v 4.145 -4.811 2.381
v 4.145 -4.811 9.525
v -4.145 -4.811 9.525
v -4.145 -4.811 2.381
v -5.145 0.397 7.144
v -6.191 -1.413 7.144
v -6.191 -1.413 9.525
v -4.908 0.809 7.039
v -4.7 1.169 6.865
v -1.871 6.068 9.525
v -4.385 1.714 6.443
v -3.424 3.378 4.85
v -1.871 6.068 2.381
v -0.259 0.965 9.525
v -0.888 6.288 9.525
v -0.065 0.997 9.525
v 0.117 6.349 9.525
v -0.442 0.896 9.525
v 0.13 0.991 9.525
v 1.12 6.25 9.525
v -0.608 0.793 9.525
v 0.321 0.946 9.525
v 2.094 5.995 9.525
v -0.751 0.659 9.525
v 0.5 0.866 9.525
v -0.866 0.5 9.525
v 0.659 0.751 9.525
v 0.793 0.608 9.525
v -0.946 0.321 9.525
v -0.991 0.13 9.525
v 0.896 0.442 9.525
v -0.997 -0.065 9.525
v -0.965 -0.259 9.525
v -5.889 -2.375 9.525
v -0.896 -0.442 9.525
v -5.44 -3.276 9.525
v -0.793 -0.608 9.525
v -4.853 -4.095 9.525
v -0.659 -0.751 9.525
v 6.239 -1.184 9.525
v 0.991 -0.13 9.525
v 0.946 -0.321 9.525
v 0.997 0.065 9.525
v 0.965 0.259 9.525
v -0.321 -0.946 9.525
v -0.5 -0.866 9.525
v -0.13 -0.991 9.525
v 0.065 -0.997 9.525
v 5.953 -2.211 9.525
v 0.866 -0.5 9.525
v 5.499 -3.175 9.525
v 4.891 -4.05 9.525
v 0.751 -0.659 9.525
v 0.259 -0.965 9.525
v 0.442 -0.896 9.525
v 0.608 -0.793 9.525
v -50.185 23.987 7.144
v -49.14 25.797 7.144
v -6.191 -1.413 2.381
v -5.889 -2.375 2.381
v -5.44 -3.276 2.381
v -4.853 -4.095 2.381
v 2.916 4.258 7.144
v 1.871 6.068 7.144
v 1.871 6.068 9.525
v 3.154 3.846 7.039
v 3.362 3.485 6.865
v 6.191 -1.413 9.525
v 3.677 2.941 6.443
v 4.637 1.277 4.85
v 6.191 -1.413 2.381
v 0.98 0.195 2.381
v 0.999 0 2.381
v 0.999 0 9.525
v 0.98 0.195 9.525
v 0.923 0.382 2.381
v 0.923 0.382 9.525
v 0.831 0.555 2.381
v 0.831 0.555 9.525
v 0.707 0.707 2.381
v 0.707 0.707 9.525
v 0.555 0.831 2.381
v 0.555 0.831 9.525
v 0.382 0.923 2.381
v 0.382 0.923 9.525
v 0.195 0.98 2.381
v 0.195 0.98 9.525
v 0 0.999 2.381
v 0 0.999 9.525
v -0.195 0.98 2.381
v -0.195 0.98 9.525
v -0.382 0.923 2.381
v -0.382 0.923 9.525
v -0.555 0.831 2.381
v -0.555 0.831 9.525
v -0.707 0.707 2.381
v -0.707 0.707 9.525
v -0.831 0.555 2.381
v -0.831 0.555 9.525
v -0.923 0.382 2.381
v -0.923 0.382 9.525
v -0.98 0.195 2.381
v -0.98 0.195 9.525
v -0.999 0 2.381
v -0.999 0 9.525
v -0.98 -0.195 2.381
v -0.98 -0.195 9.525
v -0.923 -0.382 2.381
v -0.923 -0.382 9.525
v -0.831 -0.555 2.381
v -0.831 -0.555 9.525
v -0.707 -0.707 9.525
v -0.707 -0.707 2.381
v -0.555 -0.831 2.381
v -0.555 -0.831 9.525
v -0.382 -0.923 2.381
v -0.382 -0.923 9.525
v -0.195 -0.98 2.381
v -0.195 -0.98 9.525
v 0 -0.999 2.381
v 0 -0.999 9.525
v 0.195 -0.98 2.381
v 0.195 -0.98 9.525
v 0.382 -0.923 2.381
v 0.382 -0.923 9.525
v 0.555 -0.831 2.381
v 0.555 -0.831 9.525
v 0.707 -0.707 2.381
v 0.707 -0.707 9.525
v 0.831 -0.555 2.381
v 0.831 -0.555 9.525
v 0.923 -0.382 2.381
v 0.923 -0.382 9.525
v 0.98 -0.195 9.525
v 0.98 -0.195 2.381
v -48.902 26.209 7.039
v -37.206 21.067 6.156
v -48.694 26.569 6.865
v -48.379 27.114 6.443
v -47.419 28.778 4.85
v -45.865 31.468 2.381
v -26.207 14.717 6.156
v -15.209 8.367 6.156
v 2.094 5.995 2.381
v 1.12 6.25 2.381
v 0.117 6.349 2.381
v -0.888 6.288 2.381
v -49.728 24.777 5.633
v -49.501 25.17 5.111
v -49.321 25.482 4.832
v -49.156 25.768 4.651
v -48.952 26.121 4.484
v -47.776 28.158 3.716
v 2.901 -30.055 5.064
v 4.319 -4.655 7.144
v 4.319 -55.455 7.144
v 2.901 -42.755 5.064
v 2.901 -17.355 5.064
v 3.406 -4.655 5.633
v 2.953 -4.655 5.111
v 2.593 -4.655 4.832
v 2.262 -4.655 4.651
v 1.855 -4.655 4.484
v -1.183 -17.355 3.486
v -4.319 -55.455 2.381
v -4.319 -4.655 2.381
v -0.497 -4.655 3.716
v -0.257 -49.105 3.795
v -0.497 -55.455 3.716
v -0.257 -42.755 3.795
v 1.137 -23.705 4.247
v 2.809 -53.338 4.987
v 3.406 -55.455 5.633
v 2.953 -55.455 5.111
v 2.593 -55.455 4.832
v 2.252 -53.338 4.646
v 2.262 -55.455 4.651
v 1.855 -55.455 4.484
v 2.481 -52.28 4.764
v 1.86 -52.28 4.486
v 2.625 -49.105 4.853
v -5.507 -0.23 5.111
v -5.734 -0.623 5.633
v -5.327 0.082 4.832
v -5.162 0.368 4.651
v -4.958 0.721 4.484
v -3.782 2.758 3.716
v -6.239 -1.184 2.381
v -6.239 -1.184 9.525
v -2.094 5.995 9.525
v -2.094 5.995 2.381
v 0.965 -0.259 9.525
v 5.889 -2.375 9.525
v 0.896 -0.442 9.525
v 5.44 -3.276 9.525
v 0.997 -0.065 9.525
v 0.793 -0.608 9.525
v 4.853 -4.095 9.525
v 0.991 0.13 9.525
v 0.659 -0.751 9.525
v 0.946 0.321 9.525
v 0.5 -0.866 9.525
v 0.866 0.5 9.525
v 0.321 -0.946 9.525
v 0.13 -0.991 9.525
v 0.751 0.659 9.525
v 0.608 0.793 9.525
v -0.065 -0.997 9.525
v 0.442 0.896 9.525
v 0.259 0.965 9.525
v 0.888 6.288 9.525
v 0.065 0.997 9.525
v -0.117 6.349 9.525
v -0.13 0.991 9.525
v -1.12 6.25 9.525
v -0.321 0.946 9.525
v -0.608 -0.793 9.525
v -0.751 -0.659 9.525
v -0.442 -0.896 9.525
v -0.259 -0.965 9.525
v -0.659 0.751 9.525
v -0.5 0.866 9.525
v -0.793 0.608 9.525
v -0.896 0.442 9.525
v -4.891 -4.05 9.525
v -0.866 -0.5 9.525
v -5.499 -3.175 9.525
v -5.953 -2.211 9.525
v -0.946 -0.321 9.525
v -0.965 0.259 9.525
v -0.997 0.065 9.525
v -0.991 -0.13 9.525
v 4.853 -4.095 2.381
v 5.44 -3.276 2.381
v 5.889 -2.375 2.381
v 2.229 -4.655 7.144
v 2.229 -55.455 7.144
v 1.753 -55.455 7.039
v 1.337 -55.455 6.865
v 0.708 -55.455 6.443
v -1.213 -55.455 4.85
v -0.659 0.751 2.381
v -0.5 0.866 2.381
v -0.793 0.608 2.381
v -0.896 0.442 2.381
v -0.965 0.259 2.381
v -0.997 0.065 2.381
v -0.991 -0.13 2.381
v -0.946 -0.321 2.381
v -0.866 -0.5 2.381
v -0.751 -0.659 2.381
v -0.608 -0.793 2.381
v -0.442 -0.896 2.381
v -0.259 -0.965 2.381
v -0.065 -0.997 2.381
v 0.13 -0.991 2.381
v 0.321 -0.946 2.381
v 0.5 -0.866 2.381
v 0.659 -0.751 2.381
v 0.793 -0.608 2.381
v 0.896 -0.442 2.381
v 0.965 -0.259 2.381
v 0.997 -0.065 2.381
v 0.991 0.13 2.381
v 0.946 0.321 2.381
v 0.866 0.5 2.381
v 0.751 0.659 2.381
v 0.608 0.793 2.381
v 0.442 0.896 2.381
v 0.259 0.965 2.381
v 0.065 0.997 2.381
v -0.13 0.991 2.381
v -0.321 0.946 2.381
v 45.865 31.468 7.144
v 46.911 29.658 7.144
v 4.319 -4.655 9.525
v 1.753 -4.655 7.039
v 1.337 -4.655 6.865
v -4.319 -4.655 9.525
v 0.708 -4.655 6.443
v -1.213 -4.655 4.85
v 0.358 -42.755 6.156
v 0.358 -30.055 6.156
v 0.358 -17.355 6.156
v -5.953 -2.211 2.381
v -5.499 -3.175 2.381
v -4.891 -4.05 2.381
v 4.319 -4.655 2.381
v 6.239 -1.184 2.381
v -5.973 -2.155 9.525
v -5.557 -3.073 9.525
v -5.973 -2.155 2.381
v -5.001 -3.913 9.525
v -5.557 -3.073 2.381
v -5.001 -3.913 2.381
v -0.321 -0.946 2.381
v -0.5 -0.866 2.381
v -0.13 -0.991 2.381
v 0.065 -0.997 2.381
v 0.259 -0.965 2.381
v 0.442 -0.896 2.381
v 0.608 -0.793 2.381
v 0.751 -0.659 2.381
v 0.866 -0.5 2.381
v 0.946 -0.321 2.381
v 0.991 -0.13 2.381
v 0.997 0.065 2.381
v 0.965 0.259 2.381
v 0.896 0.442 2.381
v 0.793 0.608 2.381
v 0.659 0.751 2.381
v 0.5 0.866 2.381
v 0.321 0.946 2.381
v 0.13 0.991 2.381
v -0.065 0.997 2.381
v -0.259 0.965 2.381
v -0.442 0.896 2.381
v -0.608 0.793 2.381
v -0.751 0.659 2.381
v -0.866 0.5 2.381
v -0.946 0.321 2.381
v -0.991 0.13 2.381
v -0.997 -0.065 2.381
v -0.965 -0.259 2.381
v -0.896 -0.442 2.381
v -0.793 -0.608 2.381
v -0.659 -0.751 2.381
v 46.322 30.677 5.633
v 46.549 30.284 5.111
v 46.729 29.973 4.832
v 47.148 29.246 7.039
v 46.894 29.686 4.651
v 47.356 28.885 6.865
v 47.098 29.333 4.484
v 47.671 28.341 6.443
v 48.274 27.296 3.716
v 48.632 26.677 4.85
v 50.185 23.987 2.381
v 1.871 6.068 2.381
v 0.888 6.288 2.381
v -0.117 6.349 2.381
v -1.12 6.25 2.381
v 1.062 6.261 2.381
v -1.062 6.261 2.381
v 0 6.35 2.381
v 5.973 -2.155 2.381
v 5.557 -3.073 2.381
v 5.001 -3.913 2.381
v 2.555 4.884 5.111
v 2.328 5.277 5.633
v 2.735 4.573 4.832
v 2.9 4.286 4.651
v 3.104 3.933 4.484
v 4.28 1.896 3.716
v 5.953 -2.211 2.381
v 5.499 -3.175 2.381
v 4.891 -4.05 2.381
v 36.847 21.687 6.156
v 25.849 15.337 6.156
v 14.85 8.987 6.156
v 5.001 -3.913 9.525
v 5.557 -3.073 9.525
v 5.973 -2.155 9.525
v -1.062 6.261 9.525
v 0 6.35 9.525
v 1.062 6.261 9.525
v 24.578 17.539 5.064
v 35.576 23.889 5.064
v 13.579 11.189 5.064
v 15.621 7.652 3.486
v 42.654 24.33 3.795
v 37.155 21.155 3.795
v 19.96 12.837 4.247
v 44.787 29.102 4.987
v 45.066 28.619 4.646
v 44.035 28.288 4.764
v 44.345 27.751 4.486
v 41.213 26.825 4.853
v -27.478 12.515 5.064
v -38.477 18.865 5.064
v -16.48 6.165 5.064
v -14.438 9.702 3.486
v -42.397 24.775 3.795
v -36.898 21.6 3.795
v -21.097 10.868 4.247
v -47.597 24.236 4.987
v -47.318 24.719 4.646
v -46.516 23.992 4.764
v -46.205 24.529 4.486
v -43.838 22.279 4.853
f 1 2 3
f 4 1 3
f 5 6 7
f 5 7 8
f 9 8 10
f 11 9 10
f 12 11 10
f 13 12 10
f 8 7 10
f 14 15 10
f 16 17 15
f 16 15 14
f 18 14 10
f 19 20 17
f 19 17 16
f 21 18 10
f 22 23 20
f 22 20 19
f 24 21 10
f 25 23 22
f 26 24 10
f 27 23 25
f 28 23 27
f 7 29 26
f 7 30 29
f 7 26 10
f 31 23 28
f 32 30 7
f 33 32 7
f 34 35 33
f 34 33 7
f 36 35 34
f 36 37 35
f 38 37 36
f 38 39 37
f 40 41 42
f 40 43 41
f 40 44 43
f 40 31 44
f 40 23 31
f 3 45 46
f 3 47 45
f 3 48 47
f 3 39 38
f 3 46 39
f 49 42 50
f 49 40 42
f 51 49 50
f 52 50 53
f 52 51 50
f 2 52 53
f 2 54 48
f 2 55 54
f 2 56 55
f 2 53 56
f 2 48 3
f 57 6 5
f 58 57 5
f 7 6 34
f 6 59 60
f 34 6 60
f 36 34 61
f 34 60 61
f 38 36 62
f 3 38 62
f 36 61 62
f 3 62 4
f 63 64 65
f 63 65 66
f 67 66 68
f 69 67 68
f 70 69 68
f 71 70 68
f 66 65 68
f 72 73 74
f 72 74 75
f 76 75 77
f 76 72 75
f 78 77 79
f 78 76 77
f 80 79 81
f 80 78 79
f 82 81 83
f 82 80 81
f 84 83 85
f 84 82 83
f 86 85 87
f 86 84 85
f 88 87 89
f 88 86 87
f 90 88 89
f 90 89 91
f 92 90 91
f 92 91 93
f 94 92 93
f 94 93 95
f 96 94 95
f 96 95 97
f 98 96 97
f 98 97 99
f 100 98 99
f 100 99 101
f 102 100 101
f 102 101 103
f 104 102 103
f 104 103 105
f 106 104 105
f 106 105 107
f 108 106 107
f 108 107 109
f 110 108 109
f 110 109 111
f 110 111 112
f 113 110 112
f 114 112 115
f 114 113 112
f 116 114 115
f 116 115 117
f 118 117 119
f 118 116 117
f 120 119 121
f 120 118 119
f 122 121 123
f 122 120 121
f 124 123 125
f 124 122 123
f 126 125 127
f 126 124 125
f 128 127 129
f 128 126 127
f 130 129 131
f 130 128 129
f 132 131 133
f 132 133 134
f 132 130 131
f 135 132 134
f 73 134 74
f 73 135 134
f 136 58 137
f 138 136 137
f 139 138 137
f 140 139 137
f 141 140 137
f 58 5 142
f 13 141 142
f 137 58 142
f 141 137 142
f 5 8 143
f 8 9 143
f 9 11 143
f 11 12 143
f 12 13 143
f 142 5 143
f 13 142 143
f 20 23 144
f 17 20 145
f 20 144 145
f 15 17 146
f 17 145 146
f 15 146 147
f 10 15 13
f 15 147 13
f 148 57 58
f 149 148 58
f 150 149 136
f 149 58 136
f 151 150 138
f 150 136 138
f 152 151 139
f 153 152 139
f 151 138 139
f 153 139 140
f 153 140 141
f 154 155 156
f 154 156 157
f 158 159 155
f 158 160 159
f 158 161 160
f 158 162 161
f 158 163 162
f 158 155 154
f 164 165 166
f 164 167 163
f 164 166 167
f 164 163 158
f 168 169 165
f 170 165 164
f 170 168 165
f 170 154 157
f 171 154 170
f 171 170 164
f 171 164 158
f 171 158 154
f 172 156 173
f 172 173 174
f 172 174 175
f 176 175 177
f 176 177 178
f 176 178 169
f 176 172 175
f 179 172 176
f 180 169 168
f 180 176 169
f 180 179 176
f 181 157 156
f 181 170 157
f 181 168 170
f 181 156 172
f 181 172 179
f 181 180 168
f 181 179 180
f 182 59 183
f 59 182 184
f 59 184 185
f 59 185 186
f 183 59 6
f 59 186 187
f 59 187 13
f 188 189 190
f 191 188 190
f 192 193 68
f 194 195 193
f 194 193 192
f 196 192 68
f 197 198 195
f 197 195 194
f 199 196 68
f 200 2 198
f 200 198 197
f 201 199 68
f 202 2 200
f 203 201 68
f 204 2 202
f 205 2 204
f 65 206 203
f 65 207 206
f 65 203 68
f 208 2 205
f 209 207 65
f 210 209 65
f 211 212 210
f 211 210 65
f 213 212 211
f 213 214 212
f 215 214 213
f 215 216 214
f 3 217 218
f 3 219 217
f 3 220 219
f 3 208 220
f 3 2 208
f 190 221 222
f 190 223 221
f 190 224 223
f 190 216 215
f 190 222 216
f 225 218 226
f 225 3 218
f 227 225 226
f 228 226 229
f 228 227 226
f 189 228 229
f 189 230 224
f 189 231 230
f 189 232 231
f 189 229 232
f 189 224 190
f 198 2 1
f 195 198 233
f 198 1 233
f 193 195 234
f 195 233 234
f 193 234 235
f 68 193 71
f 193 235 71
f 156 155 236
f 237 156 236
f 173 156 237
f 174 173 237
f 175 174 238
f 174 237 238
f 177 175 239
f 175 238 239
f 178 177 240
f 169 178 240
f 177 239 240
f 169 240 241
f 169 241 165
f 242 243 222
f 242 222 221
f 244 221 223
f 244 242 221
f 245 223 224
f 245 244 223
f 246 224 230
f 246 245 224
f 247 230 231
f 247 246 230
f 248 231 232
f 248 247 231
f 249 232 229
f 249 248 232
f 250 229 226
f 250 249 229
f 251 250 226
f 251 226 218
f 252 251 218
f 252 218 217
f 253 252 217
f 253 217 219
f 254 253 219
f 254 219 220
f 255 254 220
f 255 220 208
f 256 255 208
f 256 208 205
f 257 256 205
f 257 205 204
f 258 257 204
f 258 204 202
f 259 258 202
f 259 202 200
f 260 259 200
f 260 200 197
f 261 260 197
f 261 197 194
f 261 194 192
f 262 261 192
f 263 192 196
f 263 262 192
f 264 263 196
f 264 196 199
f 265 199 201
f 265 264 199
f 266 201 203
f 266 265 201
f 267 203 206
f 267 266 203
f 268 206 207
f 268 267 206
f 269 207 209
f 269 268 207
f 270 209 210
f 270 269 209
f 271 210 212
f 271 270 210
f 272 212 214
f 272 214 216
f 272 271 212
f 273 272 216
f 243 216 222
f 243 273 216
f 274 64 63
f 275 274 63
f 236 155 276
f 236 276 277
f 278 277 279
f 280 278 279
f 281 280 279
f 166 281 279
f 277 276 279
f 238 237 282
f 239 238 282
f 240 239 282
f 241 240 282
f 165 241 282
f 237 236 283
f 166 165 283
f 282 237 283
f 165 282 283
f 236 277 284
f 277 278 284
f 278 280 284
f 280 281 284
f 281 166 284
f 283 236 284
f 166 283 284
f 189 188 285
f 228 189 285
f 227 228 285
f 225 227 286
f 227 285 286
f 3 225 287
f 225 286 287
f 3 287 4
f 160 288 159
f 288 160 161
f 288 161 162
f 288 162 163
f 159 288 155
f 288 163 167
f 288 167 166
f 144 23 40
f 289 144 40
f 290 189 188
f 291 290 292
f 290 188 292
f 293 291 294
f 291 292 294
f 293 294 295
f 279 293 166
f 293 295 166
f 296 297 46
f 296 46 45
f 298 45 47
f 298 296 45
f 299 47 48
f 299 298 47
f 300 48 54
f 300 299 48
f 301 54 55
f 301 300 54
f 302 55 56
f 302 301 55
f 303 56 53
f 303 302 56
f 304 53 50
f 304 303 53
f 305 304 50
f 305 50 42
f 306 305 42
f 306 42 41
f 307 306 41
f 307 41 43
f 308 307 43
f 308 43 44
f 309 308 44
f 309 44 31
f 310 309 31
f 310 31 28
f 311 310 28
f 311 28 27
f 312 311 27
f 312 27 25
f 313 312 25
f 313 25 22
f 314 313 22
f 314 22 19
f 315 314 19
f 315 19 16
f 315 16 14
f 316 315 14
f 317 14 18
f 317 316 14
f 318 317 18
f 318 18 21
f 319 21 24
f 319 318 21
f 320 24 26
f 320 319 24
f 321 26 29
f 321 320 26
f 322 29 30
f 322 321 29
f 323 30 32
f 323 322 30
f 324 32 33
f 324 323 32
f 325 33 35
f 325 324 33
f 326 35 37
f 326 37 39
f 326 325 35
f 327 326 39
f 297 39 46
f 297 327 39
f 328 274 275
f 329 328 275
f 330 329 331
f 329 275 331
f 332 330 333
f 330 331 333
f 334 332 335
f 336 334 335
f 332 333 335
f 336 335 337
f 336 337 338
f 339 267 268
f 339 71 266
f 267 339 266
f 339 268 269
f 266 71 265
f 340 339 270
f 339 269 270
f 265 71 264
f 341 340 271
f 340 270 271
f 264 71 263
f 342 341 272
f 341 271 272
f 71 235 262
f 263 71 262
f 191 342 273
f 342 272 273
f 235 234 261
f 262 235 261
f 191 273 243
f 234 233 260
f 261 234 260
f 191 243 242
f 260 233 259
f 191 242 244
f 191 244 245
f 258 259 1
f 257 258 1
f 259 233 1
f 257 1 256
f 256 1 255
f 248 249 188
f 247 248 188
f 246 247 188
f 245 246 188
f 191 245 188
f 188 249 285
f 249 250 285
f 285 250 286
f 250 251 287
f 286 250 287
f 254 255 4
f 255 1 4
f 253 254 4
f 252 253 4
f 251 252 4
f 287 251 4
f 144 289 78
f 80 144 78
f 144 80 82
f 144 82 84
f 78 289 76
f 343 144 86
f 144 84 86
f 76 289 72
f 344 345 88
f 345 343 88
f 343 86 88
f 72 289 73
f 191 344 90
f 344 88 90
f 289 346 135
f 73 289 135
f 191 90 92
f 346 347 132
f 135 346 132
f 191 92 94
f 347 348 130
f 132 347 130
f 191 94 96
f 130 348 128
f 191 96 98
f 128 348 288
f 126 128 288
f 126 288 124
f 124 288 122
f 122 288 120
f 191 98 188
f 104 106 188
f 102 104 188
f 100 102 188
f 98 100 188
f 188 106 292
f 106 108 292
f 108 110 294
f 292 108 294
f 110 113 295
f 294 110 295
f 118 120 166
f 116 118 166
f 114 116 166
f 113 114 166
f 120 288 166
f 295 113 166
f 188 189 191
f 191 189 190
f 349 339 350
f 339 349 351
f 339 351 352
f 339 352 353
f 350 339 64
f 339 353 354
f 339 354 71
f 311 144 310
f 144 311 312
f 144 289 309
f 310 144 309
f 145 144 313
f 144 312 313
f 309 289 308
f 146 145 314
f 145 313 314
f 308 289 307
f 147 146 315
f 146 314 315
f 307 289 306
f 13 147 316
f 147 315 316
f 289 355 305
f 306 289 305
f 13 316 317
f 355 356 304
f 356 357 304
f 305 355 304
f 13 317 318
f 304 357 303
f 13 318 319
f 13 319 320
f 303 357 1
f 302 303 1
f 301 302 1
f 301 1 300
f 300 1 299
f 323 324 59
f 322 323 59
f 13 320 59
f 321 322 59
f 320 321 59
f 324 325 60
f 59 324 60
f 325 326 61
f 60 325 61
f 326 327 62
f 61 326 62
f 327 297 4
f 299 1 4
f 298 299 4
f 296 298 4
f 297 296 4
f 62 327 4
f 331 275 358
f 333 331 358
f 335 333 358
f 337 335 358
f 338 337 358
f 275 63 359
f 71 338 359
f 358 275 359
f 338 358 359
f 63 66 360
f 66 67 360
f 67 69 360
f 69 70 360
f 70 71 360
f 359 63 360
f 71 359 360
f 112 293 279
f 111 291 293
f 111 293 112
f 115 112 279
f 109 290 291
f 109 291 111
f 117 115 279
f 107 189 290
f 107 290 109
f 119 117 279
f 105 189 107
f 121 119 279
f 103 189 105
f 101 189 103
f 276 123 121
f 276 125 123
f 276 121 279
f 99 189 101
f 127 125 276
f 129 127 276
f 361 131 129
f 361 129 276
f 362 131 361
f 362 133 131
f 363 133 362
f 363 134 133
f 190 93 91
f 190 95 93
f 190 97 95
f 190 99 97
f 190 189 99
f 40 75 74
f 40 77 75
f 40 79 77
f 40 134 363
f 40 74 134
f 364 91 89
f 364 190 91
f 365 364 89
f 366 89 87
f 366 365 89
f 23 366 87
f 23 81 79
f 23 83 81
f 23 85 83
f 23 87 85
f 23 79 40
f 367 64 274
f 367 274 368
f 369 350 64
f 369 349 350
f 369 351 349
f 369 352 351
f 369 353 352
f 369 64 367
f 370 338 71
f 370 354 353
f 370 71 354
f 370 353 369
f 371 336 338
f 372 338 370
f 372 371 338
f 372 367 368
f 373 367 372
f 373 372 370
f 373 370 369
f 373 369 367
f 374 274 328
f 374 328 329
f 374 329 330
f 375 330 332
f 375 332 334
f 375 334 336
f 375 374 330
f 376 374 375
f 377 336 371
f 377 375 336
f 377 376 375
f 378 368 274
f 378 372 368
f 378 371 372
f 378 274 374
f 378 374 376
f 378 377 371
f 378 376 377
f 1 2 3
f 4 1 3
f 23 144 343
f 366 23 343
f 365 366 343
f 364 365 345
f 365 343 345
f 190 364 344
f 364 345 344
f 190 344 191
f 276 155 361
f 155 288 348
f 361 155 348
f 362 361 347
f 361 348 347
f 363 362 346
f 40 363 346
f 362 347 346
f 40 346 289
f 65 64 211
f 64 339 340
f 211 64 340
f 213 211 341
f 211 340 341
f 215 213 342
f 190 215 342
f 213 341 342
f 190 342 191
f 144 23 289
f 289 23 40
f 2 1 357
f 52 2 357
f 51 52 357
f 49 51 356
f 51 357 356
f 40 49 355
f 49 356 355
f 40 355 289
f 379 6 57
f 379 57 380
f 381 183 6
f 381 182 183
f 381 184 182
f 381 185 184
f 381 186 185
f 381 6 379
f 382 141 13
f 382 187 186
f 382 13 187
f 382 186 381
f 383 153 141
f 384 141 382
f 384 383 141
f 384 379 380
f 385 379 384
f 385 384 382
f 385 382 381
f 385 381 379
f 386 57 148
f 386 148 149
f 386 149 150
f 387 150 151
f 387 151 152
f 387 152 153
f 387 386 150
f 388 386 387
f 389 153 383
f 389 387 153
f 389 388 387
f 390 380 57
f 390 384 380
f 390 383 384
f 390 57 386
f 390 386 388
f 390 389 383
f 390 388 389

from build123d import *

# Parameters (mm, degrees)
F0_R     = 6.35
F0_R_2   = 0.99949
F1_DEPTH = 9.525
F4_DEPTH = 25.4
F6_DEPTH = 50.8
F7_COUNT = 3
F8_W     = 8.2890069642
F8_H     = 2.380754333
F9_DEPTH = 25.4


with BuildPart() as f1:
    # F0 (on Top) → F1 (new body)
    with BuildSketch(Plane.XY):
        Circle(F0_R)
        Circle(F0_R_2, mode=Mode.SUBTRACT)
    extrude(amount=F1_DEPTH)

    # F3 (on offset) → F4 (cut)
    with BuildSketch(Plane.XY.offset(9.525)):
        Polygon((-19.2380820383, -11.0045537162), (19.2410791448, -11.0045537162), (0.0014985533, 22.3193773847), align=None)
        Polygon((0.0014985533, 9.6193773847), (8.2425565167, -4.6545537162), (-8.2395594102, -4.6545537162), (-8.2425565167, -4.6545537162), (0, 9.621972955), align=None, mode=Mode.SUBTRACT)
    extrude(amount=-F4_DEPTH, mode=Mode.SUBTRACT)

    # F5 (on face) → F6 (join)
    with BuildSketch(Plane.XZ.offset(4.6545537162)):
        with BuildLine():
            add(Edge.make_bspline(
                [(4.319447847, 7.14375), (3.8768217141, 6.3398531681), (3.0702504394, 4.8749597867), (1.3331871276, 4.307573582), (-1.2552066512, 3.4811706955), (-3.2623562204, 2.7606969439), (-4.319447847, 2.38125)],
                knots=[0, 0, 0, 0, 0.2497283334, 0.4550650881, 0.7130028867, 1, 1, 1, 1], degree=3))
            Line((4.319447847, 7.14375), (2.2289671052, 7.14375))
            add(Edge.make_bspline(
                [(2.2289671052, 7.14375), (2.0794537401, 7.1223183312), (1.3375273881, 6.9699970017), (0.3270313355, 6.1326811809), (-1.7535535369, 4.3851427196), (-3.4342742537, 3.0725461739), (-4.319447847, 2.38125)],
                knots=[0.2009623726, 0.2009623726, 0.2009623726, 0.2009623726, 0.2497283334, 0.4550650881, 0.7130028867, 1, 1, 1, 1], degree=3))
        make_face()
    extrude(amount=F6_DEPTH)


with BuildPart() as f7_1:
    # F7: instance of F1
    add(f1.part.rotate(Axis((0, 0, 9.525), (0, 0, 1)), 1 * 360 / F7_COUNT))


with BuildPart() as f7_2:
    # F7: instance of F1
    add(f1.part.rotate(Axis((0, 0, 9.525), (0, 0, 1)), 2 * 360 / F7_COUNT))


with BuildPart() as f9_tool:
    # F8 (on face) → F9 (new body)
    with BuildSketch(Plane.XZ.offset(4.8109864775)):
        Polygon((-4.1445034821, 2.380754333), (-6.2417029403, 2.380754333), (-6.2417029403, -0.2239797032), (6.5267146565, -0.2239797032), (6.5267146565, 2.380754333), (4.1445034821, 2.380754333), (4.1445034821, 0), (-4.1445034821, 0), align=None)
        with Locations((0, 1.1903771665)):
            Rectangle(F8_W, F8_H)
    extrude(amount=-F9_DEPTH)


with BuildPart() as f1_1:
    add(f1.part)

    # F9: cut by f9_tool
    add(f9_tool.part, mode=Mode.SUBTRACT)


with BuildPart() as f7_1_1:
    add(f7_1.part)

    # F9: cut by f9_tool
    add(f9_tool.part, mode=Mode.SUBTRACT)


with BuildPart() as f7_2_1:
    add(f7_2.part)

    # F9: cut by f9_tool
    add(f9_tool.part, mode=Mode.SUBTRACT)


solid = Compound([f1_1.part, f7_1_1.part, f7_2_1.part])
